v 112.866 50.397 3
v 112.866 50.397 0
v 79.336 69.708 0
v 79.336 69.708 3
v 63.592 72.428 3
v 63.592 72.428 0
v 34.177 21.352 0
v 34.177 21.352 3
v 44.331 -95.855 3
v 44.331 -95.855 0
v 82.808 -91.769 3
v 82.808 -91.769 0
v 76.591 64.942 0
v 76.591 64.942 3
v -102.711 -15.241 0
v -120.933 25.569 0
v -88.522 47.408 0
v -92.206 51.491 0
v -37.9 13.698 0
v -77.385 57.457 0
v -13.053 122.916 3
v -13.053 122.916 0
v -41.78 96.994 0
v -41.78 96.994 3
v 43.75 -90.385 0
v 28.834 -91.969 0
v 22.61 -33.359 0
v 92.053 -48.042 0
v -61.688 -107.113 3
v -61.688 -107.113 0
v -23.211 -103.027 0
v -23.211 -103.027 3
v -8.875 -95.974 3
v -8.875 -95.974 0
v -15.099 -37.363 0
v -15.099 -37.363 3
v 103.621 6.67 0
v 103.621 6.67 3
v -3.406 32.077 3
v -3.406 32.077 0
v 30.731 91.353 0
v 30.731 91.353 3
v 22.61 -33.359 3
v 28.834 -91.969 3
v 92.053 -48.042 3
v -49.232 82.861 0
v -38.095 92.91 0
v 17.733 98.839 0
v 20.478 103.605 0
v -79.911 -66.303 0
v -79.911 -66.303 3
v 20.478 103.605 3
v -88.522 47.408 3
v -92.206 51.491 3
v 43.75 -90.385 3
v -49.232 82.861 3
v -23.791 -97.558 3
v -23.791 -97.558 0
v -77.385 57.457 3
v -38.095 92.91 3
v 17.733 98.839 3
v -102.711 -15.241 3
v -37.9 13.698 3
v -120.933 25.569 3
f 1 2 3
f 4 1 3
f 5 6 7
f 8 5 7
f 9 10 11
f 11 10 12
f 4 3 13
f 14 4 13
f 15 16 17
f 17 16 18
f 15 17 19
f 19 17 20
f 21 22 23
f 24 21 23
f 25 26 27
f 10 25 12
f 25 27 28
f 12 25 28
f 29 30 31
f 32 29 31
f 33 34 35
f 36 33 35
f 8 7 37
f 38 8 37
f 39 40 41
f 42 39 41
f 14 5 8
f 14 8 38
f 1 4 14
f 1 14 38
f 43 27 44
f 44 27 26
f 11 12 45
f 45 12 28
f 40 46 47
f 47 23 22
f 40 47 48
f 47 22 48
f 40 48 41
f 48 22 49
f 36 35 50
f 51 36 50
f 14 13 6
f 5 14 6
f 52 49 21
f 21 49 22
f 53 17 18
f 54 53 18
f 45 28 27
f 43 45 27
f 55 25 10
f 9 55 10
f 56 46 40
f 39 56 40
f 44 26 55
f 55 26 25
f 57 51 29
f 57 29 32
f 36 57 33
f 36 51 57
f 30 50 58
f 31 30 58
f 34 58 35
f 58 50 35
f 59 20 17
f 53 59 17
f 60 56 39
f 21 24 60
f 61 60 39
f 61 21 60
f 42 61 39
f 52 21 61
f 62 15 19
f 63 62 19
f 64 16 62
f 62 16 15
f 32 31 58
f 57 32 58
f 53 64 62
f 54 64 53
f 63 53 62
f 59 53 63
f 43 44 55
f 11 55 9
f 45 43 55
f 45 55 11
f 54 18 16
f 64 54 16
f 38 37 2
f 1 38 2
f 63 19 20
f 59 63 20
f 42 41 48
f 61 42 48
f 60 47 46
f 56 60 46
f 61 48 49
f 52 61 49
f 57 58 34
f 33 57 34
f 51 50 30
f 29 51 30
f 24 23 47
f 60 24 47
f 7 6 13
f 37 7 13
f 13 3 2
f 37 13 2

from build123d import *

# Parameters (mm, degrees)
BOSS_EXTRUDE1_DEPTH   = 3
BOSS_EXTRUDE1_2_DEPTH = 3
BOSS_EXTRUDE1_3_DEPTH = 3
BOSS_EXTRUDE1_4_DEPTH = 3
BOSS_EXTRUDE1_5_DEPTH = 3


with BuildPart() as part:
    # Sketch14 → Boss-Extrude1 (new body)
    with BuildSketch(Plane.XY):
        Polygon((-37.89950418, 13.698390813), (-77.385194882, 57.456786854), (-88.521546505, 47.4078231), (-92.206166548, 51.491152029), (-120.9333121, 25.569013955), (-102.710745723, -15.241146353), align=None)
    extrude(amount=BOSS_EXTRUDE1_DEPTH)


with BuildPart() as body_2:
    # Sketch14 → Boss-Extrude1 2 (new body)
    with BuildSketch(Plane.XY):
        Polygon((30.731311211, 91.352817438), (17.732856848, 98.838816638), (20.477723222, 103.604916573), (-13.052871288, 122.915674351), (-41.780016842, 96.993536275), (-38.095396799, 92.910207346), (-49.231748418, 82.861243596), (-3.406394247, 32.077175727), align=None)
    extrude(amount=BOSS_EXTRUDE1_2_DEPTH)


with BuildPart() as body_3:
    # Sketch14 → Boss-Extrude1 3 (new body)
    with BuildSketch(Plane.XY):
        Polygon((-15.099350796, -37.363457194), (-79.910592339, -66.30299436), (-61.688025962, -107.113154668), (-23.210626543, -103.027096932), (-23.791426251, -97.557849113), (-8.875295839, -95.973849909), align=None)
    extrude(amount=BOSS_EXTRUDE1_3_DEPTH)


with BuildPart() as body_4:
    # Sketch14 → Boss-Extrude1 4 (new body)
    with BuildSketch(Plane.XY):
        Polygon((112.866193993, 50.397050544), (79.335599486, 69.70780832), (76.590733112, 64.941708386), (63.592278746, 72.427707588), (34.177320511, 21.352496122), (103.6209495, 6.669981537), align=None)
    extrude(amount=BOSS_EXTRUDE1_4_DEPTH)


with BuildPart() as body_5:
    # Sketch14 → Boss-Extrude1 5 (new body)
    with BuildSketch(Plane.XY):
        Polygon((22.609630859, -33.35900059), (28.833685816, -91.969393304), (43.749816229, -90.3853941), (44.330615937, -95.854641918), (82.808015356, -91.768584182), (92.053259849, -48.041515175), align=None)
    extrude(amount=BOSS_EXTRUDE1_5_DEPTH)


solid = Compound([part.part, body_2.part, body_3.part, body_4.part, body_5.part])
